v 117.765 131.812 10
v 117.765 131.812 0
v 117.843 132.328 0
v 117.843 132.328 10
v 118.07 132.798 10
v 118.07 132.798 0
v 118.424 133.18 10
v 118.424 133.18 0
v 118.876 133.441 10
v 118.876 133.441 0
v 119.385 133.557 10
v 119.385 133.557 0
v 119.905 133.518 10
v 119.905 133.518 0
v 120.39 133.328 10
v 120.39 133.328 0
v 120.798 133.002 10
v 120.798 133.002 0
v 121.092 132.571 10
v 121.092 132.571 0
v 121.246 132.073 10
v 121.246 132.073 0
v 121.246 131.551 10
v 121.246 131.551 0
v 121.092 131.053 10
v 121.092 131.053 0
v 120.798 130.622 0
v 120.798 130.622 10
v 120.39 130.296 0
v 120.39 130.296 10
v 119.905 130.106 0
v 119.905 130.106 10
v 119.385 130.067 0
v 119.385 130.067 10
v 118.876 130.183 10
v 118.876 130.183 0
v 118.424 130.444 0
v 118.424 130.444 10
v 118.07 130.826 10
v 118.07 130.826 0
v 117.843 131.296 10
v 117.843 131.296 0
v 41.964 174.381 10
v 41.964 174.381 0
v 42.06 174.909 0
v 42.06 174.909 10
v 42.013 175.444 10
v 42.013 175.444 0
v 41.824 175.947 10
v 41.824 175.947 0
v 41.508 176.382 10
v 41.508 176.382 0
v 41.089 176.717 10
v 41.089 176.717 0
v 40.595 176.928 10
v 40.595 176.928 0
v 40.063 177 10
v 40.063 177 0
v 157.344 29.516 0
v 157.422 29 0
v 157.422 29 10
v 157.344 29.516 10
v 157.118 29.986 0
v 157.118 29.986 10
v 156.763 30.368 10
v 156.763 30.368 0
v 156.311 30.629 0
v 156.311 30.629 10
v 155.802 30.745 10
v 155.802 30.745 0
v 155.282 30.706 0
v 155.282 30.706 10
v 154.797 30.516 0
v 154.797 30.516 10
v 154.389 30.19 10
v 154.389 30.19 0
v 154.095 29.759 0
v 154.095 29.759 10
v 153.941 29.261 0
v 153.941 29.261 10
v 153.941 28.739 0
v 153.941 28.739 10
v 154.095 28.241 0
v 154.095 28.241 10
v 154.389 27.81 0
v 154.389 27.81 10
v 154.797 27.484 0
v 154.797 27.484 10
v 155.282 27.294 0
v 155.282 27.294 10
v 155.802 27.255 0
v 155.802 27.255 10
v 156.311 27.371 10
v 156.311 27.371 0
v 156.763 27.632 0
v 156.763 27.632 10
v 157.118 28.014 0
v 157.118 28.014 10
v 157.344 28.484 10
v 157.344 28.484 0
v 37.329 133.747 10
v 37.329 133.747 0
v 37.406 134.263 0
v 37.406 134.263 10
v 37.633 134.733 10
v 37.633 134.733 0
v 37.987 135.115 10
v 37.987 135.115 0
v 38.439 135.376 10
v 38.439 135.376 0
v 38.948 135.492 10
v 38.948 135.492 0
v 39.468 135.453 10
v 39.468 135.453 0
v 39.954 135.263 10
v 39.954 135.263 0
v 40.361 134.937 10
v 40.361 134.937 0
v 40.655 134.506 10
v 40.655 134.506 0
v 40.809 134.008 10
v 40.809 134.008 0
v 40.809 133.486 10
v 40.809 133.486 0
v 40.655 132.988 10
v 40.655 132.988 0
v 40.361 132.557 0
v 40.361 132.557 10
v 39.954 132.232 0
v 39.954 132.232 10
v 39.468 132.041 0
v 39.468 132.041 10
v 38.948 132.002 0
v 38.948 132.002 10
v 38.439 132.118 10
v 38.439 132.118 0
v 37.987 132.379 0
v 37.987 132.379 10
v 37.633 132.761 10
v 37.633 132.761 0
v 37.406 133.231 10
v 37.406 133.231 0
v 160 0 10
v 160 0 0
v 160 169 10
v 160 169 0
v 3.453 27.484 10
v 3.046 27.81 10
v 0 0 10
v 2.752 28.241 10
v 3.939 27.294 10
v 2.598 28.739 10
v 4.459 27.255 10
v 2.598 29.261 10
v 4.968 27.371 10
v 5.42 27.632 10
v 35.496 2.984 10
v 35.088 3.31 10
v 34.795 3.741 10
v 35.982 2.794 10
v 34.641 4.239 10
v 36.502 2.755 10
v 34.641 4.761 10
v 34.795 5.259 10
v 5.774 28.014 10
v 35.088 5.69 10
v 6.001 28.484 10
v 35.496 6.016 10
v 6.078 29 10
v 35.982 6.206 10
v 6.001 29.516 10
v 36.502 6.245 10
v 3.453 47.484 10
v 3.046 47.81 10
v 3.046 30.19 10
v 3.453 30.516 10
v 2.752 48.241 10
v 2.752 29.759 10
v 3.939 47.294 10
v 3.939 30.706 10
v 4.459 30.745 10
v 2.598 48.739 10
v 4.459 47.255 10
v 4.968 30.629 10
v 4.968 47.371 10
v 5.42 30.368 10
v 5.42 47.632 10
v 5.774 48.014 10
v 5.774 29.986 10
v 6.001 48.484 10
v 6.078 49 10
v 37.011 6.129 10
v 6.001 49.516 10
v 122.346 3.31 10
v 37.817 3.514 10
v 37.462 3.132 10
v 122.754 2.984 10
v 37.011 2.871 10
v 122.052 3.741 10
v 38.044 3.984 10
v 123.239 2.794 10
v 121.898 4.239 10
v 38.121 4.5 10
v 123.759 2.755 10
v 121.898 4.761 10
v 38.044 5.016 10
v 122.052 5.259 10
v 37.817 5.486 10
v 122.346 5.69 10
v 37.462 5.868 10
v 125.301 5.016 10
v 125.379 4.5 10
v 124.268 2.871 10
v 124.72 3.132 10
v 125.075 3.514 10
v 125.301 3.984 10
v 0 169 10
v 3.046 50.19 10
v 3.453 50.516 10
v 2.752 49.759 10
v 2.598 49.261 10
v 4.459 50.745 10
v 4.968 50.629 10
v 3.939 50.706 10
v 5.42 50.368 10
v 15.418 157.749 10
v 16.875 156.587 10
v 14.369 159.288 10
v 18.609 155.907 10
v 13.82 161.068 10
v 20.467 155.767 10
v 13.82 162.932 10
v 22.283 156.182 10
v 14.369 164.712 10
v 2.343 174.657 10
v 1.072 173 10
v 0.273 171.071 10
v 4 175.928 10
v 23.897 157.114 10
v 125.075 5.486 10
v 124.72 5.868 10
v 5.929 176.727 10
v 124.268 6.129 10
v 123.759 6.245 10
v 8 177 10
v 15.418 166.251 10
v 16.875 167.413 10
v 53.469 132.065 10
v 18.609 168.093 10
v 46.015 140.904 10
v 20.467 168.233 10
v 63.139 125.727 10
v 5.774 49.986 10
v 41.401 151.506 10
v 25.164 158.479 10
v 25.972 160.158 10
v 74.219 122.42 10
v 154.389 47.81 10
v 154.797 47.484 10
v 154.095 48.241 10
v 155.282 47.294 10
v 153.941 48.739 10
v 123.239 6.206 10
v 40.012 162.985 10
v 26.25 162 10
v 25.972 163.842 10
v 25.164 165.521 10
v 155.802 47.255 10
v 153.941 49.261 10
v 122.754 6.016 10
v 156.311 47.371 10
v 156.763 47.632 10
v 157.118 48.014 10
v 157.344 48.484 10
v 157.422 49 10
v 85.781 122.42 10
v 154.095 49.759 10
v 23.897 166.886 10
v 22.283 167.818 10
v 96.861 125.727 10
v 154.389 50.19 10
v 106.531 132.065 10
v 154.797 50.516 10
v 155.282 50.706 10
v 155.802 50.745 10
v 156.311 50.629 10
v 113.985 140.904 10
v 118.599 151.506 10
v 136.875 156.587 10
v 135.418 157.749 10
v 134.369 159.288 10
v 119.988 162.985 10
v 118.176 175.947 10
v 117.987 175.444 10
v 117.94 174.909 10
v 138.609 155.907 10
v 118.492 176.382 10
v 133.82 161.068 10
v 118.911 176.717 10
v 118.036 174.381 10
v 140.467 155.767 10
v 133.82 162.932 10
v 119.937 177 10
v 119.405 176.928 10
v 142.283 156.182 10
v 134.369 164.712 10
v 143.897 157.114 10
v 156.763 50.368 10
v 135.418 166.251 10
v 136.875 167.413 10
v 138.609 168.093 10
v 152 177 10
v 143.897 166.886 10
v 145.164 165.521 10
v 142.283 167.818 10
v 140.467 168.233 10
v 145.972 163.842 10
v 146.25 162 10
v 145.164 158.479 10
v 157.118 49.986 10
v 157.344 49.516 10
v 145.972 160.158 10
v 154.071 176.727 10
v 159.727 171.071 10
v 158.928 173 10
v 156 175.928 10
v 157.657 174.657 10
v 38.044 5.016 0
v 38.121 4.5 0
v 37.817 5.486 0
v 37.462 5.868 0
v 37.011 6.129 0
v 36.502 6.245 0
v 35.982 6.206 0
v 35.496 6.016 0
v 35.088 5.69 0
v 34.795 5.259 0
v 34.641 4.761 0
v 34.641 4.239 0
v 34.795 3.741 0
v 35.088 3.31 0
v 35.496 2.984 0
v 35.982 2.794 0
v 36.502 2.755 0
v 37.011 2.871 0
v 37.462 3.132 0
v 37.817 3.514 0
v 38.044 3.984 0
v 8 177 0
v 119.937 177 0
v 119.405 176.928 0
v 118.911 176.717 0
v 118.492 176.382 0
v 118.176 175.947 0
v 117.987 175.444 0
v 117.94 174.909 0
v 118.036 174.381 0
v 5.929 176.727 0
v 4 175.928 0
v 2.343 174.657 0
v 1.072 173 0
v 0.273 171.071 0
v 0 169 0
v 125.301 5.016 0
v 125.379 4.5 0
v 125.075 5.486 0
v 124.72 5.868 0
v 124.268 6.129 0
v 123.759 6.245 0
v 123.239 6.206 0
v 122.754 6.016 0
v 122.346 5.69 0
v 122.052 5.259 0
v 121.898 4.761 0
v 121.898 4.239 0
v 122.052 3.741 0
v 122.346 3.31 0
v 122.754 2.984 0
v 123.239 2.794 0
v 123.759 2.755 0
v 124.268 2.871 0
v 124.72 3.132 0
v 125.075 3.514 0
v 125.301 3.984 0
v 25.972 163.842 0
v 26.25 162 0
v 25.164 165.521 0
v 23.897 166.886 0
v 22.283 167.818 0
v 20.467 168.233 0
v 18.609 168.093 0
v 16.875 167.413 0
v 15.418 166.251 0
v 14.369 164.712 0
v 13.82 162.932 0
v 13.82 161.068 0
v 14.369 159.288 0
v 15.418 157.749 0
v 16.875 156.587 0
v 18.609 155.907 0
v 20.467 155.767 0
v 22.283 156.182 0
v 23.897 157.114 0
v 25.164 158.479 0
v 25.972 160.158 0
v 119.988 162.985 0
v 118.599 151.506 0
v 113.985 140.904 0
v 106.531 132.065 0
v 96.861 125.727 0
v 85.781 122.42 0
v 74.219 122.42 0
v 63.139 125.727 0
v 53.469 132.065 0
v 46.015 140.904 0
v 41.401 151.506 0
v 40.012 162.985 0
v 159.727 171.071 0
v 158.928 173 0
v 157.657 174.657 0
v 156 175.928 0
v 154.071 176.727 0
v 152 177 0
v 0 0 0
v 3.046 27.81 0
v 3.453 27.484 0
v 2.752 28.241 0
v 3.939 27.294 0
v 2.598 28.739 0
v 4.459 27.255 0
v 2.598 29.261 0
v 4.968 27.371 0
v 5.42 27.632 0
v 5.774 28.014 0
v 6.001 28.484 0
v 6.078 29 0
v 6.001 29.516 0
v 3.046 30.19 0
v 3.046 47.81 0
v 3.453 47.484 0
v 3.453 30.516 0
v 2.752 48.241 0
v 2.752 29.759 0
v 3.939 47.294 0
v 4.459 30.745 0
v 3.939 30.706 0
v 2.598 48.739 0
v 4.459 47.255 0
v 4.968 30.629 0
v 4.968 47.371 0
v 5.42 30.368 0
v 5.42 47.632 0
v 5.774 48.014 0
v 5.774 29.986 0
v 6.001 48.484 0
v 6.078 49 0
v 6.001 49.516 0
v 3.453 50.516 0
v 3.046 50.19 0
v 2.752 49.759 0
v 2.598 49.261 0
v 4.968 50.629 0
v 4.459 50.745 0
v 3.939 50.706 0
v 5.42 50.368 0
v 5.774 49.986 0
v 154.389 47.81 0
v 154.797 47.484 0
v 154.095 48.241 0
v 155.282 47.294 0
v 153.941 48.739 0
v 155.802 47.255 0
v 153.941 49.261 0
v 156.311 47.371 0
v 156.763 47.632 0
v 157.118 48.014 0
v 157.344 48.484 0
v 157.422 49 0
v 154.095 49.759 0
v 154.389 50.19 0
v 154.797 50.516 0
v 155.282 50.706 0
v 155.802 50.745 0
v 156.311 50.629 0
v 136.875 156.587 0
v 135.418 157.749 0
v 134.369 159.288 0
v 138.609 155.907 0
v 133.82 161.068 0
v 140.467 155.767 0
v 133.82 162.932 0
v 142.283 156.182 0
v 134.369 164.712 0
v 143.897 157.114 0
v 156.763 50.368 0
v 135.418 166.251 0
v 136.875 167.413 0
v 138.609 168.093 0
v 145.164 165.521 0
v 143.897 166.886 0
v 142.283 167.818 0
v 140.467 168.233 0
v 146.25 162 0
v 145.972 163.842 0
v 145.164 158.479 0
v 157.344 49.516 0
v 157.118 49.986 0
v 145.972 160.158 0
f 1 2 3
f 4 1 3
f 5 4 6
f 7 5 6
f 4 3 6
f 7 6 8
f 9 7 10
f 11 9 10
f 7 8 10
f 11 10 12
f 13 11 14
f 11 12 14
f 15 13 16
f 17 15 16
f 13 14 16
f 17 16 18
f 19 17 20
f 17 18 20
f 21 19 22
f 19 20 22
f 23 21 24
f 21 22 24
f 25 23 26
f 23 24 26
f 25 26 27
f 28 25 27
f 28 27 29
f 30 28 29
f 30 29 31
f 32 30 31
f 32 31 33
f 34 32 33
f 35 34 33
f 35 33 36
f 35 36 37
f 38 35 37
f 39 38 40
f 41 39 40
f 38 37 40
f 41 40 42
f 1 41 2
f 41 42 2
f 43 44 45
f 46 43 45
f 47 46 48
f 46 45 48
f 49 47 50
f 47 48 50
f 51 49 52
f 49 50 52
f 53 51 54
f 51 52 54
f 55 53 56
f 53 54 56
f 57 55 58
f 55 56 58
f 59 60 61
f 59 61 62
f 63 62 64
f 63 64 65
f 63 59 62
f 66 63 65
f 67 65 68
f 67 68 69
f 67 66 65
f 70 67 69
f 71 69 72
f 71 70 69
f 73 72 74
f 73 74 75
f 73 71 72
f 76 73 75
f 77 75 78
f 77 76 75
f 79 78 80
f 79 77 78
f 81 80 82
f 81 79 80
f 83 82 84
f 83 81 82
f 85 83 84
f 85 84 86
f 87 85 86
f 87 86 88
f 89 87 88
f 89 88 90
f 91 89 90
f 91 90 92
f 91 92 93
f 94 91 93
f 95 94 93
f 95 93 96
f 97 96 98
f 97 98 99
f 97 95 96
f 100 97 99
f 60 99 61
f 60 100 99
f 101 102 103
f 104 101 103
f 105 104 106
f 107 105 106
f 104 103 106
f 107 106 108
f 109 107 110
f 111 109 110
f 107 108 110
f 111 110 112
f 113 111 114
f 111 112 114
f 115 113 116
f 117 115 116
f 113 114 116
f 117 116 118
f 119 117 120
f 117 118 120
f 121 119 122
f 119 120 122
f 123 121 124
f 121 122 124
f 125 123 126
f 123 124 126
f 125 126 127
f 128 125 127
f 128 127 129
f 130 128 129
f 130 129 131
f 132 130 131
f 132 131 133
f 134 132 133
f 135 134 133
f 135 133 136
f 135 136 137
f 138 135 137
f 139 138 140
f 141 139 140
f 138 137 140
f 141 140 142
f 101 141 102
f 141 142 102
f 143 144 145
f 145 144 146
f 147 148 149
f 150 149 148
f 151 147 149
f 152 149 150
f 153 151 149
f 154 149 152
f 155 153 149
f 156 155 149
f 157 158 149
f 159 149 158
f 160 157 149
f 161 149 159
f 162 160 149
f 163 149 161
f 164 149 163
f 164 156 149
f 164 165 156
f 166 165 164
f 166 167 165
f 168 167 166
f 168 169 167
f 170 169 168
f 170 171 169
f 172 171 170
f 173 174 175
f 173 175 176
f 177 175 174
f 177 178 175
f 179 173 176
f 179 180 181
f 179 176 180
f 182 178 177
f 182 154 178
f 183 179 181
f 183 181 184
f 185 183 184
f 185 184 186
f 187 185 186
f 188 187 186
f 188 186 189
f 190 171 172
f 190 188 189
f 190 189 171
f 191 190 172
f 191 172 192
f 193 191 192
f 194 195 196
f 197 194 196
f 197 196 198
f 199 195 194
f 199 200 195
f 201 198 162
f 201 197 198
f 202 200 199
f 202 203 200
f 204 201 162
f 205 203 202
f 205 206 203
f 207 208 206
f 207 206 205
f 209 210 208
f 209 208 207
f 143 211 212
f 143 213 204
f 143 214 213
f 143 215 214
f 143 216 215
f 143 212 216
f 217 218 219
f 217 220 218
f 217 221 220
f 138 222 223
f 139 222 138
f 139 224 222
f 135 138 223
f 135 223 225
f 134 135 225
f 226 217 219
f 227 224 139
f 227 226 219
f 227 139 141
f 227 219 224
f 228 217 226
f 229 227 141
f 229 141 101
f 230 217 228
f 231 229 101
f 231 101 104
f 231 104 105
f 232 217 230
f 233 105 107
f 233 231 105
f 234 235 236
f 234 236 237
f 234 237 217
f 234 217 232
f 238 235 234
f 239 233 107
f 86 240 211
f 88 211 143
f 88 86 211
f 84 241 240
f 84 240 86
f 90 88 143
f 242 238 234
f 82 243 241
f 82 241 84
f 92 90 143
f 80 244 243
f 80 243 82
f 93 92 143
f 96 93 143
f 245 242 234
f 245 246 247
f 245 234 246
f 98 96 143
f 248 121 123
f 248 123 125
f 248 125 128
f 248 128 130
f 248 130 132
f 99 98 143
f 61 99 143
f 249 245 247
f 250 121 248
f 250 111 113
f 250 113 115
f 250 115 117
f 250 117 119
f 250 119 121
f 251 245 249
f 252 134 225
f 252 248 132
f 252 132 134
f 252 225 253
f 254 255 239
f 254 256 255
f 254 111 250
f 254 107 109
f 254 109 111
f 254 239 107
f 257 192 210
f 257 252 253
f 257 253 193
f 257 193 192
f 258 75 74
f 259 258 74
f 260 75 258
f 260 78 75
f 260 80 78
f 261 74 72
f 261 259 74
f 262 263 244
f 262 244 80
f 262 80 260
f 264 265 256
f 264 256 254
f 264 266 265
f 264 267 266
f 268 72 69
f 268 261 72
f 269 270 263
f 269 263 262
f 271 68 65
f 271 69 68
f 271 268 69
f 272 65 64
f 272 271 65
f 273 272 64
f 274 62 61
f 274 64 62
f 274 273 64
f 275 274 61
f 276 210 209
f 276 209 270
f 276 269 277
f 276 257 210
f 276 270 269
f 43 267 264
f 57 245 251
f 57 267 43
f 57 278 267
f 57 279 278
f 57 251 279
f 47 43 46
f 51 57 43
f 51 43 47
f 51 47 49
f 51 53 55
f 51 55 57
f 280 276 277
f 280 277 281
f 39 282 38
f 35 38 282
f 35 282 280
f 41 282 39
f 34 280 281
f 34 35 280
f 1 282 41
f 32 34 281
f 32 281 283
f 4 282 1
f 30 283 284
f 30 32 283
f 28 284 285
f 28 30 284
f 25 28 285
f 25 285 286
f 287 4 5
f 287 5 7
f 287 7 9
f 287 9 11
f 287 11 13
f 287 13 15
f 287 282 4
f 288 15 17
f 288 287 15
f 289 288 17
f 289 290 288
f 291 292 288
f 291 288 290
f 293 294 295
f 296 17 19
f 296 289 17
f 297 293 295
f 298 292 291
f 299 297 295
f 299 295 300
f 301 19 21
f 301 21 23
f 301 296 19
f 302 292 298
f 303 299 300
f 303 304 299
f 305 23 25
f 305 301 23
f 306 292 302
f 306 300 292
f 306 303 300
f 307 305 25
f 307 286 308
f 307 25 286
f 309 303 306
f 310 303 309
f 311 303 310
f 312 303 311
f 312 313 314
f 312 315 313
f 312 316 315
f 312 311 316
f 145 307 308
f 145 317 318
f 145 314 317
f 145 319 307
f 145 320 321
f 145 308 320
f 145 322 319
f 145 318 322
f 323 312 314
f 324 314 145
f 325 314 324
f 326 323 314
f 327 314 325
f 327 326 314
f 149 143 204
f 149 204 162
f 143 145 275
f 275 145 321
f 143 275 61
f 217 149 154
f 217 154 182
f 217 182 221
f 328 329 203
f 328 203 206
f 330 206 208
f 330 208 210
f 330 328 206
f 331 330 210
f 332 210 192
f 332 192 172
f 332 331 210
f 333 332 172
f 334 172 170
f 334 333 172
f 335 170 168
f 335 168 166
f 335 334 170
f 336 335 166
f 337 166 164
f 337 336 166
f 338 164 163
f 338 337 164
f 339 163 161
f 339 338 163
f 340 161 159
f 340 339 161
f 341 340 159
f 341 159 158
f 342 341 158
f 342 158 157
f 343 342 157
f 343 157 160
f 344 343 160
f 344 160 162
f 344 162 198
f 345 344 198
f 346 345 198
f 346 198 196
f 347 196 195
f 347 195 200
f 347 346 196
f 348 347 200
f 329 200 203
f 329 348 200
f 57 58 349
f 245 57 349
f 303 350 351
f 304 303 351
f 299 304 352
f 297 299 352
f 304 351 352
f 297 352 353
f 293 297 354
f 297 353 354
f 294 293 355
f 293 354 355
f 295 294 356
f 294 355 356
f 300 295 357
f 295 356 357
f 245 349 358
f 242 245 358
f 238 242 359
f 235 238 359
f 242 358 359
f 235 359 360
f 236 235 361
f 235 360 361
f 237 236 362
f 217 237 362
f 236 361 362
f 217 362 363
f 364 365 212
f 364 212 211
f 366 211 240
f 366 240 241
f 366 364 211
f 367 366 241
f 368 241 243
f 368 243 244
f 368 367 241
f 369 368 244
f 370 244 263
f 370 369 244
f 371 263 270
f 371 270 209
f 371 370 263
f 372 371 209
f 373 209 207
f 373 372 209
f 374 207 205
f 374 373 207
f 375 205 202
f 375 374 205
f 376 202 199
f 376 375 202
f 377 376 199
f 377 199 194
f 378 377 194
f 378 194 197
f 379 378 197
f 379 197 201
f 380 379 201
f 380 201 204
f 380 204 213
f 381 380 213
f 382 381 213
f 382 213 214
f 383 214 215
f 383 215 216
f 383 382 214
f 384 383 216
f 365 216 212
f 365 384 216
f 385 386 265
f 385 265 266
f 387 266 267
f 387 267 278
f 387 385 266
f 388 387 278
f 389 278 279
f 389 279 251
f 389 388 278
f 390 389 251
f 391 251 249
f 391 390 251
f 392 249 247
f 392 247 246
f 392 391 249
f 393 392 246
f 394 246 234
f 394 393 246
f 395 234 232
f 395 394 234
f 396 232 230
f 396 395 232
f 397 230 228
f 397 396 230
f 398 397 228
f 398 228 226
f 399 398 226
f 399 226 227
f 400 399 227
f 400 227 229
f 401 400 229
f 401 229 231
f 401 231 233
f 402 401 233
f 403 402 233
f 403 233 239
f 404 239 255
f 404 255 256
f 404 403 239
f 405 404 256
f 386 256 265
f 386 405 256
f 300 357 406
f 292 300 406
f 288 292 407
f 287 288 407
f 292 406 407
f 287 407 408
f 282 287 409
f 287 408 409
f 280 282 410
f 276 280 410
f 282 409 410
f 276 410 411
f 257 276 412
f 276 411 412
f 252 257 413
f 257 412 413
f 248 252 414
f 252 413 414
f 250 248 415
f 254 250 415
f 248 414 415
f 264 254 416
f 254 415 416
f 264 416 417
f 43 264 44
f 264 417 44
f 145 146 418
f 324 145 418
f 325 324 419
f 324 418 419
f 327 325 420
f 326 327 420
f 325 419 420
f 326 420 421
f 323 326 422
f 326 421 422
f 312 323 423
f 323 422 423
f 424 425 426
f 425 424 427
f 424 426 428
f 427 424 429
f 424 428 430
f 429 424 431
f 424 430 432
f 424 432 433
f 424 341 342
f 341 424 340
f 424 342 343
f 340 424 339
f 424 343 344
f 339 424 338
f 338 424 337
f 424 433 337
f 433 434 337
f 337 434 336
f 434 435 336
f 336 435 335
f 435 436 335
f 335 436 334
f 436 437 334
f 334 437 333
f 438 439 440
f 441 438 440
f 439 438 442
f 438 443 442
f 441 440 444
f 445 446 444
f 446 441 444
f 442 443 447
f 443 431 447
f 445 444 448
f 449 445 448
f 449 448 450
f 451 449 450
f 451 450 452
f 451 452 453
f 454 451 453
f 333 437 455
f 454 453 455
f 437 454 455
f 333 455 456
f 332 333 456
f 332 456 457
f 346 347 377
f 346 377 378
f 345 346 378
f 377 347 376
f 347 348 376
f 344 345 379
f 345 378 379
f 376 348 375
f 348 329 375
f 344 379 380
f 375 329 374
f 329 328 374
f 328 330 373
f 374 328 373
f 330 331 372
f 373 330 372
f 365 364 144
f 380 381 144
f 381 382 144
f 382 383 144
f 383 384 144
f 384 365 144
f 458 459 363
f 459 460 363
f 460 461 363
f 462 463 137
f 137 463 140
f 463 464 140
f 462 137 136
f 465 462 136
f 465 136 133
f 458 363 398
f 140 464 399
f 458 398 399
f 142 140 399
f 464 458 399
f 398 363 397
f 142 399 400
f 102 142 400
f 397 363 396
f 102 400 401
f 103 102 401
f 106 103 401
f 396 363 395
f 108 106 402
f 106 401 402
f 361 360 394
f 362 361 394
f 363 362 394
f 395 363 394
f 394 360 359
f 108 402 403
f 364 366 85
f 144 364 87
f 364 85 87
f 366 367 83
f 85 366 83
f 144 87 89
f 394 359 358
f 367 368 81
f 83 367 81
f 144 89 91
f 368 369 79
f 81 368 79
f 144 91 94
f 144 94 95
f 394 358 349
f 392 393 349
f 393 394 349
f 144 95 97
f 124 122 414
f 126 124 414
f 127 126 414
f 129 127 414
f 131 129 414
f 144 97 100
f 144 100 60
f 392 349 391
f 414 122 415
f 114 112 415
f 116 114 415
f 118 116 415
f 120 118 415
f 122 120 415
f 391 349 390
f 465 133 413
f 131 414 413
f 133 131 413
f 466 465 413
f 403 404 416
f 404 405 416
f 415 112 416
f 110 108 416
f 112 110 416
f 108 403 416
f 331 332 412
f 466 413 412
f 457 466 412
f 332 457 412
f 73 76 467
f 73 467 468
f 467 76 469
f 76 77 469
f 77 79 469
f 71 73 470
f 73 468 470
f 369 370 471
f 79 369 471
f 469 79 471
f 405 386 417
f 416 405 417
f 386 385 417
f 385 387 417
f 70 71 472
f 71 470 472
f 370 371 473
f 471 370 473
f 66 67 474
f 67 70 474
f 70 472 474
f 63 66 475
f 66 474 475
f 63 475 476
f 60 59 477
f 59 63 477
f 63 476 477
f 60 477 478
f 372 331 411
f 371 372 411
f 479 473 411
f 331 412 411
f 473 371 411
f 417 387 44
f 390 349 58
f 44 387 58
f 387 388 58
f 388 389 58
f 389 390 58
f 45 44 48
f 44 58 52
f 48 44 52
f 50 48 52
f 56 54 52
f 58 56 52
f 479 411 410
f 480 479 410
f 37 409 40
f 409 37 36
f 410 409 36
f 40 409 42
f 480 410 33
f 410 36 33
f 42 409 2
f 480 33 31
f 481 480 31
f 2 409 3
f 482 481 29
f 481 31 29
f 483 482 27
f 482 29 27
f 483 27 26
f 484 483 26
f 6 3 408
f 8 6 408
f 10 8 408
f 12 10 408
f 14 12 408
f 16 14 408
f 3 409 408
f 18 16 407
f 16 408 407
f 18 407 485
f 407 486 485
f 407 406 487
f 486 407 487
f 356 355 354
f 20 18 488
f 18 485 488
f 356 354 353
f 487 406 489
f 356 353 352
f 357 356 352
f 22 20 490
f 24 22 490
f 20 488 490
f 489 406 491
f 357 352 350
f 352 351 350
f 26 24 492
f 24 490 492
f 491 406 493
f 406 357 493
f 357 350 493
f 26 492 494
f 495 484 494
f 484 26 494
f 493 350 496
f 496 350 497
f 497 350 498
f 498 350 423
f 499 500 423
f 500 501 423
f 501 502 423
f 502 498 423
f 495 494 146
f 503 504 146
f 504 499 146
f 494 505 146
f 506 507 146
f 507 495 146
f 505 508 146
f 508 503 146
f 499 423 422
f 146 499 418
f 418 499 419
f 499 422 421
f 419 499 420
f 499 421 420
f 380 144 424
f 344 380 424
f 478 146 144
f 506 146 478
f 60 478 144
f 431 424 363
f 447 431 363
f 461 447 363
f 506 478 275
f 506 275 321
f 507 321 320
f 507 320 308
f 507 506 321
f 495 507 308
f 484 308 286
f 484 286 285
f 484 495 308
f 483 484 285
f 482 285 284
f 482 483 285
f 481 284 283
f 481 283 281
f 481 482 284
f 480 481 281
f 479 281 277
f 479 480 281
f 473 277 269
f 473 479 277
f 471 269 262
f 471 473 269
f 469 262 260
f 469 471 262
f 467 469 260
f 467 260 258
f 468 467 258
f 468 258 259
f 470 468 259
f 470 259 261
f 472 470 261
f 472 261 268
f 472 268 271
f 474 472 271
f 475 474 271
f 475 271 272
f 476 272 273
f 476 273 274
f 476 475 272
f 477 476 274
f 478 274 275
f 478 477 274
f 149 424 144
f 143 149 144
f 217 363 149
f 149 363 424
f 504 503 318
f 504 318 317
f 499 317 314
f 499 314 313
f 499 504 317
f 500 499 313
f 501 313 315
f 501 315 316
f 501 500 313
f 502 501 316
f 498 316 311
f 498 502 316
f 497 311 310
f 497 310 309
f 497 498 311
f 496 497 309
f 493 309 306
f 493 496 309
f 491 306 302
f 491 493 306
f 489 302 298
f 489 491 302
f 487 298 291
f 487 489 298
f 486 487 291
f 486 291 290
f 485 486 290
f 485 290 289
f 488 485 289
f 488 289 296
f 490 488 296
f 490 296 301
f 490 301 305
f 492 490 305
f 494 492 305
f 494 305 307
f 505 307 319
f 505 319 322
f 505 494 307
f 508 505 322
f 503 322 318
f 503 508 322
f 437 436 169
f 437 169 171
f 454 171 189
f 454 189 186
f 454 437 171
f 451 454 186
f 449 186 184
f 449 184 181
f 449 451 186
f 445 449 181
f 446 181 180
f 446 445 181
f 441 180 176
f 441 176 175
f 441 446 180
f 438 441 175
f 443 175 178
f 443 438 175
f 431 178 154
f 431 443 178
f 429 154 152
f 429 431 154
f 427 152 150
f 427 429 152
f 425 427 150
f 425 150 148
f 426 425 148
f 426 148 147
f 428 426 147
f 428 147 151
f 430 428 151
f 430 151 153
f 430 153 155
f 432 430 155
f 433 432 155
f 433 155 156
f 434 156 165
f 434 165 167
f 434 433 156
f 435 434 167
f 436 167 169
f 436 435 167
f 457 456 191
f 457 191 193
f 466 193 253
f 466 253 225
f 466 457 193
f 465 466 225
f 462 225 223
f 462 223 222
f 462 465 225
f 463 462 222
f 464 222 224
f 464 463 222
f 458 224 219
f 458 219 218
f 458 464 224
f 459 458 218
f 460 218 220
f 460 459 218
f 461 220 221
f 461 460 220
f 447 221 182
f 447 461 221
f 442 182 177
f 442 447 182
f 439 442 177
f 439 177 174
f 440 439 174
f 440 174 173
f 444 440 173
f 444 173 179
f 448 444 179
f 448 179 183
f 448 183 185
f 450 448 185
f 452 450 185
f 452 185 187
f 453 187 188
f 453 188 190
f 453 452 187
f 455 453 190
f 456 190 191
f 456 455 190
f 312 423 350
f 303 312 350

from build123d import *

# Parameters (mm, degrees)
SKETCH1_R           = 6.25
SKETCH1_R_2         = 1.75
BOSS_EXTRUDE1_DEPTH = 10
SKETCH11_R          = 1.75
CUT_EXTRUDE2_DEPTH  = 10


with BuildPart() as part:
    # Sketch1 → Boss-Extrude1 (new body)
    with BuildSketch(Plane.XY):
        with BuildLine():
            Line((0, 0), (40, 0))
            Line((40, 0), (120, 0))
            Line((120, 0), (160, 0))
            Line((160, 0), (160, 169))
            ThreePointArc((160, 169), (157.656854249, 174.656854249), (152, 177))
            Line((152, 177), (120, 177))
            Line((120, 177), (119.937451095, 177))
            ThreePointArc((119.937451095, 177), (118.319103908, 176.175139303), (118.03566771, 174.380952381))
            ThreePointArc((118.03566771, 174.380952381), (80, 122), (41.96433229, 174.380952381))
            ThreePointArc((41.96433229, 174.380952381), (41.680896092, 176.175139303), (40.062548905, 177))
            Line((40.062548905, 177), (40, 177))
            Line((40, 177), (8, 177))
            ThreePointArc((8, 177), (2.343145751, 174.656854249), (0, 169))
            Line((0, 169), (0, 0))
        make_face()
        with Locations((20, 162)):
            Circle(SKETCH1_R, mode=Mode.SUBTRACT)
        with Locations((140, 162)):
            Circle(SKETCH1_R, mode=Mode.SUBTRACT)
        with Locations((4.328403696, 49)):
            Circle(SKETCH1_R_2, mode=Mode.SUBTRACT)
        with Locations((4.328403696, 29)):
            Circle(SKETCH1_R_2, mode=Mode.SUBTRACT)
        with Locations((36.371302772, 4.5)):
            Circle(SKETCH1_R_2, mode=Mode.SUBTRACT)
        with Locations((123.628697228, 4.5)):
            Circle(SKETCH1_R_2, mode=Mode.SUBTRACT)
        with Locations((155.671596304, 29)):
            Circle(SKETCH1_R_2, mode=Mode.SUBTRACT)
        with Locations((155.671596304, 49)):
            Circle(SKETCH1_R_2, mode=Mode.SUBTRACT)
    extrude(amount=BOSS_EXTRUDE1_DEPTH)

    # Sketch11 → Cut-Extrude2 (cut)
    with BuildSketch(Plane(origin=(0, 0, 0), x_dir=(-1, 0, 0), z_dir=(0, 0, -1))):
        with Locations((-119.515447903, 131.8119911)):
            Circle(SKETCH11_R)
        with Locations((-39.078552479, 133.747183554)):
            Circle(SKETCH11_R)
    extrude(amount=-CUT_EXTRUDE2_DEPTH, mode=Mode.SUBTRACT)


solid = part.part
